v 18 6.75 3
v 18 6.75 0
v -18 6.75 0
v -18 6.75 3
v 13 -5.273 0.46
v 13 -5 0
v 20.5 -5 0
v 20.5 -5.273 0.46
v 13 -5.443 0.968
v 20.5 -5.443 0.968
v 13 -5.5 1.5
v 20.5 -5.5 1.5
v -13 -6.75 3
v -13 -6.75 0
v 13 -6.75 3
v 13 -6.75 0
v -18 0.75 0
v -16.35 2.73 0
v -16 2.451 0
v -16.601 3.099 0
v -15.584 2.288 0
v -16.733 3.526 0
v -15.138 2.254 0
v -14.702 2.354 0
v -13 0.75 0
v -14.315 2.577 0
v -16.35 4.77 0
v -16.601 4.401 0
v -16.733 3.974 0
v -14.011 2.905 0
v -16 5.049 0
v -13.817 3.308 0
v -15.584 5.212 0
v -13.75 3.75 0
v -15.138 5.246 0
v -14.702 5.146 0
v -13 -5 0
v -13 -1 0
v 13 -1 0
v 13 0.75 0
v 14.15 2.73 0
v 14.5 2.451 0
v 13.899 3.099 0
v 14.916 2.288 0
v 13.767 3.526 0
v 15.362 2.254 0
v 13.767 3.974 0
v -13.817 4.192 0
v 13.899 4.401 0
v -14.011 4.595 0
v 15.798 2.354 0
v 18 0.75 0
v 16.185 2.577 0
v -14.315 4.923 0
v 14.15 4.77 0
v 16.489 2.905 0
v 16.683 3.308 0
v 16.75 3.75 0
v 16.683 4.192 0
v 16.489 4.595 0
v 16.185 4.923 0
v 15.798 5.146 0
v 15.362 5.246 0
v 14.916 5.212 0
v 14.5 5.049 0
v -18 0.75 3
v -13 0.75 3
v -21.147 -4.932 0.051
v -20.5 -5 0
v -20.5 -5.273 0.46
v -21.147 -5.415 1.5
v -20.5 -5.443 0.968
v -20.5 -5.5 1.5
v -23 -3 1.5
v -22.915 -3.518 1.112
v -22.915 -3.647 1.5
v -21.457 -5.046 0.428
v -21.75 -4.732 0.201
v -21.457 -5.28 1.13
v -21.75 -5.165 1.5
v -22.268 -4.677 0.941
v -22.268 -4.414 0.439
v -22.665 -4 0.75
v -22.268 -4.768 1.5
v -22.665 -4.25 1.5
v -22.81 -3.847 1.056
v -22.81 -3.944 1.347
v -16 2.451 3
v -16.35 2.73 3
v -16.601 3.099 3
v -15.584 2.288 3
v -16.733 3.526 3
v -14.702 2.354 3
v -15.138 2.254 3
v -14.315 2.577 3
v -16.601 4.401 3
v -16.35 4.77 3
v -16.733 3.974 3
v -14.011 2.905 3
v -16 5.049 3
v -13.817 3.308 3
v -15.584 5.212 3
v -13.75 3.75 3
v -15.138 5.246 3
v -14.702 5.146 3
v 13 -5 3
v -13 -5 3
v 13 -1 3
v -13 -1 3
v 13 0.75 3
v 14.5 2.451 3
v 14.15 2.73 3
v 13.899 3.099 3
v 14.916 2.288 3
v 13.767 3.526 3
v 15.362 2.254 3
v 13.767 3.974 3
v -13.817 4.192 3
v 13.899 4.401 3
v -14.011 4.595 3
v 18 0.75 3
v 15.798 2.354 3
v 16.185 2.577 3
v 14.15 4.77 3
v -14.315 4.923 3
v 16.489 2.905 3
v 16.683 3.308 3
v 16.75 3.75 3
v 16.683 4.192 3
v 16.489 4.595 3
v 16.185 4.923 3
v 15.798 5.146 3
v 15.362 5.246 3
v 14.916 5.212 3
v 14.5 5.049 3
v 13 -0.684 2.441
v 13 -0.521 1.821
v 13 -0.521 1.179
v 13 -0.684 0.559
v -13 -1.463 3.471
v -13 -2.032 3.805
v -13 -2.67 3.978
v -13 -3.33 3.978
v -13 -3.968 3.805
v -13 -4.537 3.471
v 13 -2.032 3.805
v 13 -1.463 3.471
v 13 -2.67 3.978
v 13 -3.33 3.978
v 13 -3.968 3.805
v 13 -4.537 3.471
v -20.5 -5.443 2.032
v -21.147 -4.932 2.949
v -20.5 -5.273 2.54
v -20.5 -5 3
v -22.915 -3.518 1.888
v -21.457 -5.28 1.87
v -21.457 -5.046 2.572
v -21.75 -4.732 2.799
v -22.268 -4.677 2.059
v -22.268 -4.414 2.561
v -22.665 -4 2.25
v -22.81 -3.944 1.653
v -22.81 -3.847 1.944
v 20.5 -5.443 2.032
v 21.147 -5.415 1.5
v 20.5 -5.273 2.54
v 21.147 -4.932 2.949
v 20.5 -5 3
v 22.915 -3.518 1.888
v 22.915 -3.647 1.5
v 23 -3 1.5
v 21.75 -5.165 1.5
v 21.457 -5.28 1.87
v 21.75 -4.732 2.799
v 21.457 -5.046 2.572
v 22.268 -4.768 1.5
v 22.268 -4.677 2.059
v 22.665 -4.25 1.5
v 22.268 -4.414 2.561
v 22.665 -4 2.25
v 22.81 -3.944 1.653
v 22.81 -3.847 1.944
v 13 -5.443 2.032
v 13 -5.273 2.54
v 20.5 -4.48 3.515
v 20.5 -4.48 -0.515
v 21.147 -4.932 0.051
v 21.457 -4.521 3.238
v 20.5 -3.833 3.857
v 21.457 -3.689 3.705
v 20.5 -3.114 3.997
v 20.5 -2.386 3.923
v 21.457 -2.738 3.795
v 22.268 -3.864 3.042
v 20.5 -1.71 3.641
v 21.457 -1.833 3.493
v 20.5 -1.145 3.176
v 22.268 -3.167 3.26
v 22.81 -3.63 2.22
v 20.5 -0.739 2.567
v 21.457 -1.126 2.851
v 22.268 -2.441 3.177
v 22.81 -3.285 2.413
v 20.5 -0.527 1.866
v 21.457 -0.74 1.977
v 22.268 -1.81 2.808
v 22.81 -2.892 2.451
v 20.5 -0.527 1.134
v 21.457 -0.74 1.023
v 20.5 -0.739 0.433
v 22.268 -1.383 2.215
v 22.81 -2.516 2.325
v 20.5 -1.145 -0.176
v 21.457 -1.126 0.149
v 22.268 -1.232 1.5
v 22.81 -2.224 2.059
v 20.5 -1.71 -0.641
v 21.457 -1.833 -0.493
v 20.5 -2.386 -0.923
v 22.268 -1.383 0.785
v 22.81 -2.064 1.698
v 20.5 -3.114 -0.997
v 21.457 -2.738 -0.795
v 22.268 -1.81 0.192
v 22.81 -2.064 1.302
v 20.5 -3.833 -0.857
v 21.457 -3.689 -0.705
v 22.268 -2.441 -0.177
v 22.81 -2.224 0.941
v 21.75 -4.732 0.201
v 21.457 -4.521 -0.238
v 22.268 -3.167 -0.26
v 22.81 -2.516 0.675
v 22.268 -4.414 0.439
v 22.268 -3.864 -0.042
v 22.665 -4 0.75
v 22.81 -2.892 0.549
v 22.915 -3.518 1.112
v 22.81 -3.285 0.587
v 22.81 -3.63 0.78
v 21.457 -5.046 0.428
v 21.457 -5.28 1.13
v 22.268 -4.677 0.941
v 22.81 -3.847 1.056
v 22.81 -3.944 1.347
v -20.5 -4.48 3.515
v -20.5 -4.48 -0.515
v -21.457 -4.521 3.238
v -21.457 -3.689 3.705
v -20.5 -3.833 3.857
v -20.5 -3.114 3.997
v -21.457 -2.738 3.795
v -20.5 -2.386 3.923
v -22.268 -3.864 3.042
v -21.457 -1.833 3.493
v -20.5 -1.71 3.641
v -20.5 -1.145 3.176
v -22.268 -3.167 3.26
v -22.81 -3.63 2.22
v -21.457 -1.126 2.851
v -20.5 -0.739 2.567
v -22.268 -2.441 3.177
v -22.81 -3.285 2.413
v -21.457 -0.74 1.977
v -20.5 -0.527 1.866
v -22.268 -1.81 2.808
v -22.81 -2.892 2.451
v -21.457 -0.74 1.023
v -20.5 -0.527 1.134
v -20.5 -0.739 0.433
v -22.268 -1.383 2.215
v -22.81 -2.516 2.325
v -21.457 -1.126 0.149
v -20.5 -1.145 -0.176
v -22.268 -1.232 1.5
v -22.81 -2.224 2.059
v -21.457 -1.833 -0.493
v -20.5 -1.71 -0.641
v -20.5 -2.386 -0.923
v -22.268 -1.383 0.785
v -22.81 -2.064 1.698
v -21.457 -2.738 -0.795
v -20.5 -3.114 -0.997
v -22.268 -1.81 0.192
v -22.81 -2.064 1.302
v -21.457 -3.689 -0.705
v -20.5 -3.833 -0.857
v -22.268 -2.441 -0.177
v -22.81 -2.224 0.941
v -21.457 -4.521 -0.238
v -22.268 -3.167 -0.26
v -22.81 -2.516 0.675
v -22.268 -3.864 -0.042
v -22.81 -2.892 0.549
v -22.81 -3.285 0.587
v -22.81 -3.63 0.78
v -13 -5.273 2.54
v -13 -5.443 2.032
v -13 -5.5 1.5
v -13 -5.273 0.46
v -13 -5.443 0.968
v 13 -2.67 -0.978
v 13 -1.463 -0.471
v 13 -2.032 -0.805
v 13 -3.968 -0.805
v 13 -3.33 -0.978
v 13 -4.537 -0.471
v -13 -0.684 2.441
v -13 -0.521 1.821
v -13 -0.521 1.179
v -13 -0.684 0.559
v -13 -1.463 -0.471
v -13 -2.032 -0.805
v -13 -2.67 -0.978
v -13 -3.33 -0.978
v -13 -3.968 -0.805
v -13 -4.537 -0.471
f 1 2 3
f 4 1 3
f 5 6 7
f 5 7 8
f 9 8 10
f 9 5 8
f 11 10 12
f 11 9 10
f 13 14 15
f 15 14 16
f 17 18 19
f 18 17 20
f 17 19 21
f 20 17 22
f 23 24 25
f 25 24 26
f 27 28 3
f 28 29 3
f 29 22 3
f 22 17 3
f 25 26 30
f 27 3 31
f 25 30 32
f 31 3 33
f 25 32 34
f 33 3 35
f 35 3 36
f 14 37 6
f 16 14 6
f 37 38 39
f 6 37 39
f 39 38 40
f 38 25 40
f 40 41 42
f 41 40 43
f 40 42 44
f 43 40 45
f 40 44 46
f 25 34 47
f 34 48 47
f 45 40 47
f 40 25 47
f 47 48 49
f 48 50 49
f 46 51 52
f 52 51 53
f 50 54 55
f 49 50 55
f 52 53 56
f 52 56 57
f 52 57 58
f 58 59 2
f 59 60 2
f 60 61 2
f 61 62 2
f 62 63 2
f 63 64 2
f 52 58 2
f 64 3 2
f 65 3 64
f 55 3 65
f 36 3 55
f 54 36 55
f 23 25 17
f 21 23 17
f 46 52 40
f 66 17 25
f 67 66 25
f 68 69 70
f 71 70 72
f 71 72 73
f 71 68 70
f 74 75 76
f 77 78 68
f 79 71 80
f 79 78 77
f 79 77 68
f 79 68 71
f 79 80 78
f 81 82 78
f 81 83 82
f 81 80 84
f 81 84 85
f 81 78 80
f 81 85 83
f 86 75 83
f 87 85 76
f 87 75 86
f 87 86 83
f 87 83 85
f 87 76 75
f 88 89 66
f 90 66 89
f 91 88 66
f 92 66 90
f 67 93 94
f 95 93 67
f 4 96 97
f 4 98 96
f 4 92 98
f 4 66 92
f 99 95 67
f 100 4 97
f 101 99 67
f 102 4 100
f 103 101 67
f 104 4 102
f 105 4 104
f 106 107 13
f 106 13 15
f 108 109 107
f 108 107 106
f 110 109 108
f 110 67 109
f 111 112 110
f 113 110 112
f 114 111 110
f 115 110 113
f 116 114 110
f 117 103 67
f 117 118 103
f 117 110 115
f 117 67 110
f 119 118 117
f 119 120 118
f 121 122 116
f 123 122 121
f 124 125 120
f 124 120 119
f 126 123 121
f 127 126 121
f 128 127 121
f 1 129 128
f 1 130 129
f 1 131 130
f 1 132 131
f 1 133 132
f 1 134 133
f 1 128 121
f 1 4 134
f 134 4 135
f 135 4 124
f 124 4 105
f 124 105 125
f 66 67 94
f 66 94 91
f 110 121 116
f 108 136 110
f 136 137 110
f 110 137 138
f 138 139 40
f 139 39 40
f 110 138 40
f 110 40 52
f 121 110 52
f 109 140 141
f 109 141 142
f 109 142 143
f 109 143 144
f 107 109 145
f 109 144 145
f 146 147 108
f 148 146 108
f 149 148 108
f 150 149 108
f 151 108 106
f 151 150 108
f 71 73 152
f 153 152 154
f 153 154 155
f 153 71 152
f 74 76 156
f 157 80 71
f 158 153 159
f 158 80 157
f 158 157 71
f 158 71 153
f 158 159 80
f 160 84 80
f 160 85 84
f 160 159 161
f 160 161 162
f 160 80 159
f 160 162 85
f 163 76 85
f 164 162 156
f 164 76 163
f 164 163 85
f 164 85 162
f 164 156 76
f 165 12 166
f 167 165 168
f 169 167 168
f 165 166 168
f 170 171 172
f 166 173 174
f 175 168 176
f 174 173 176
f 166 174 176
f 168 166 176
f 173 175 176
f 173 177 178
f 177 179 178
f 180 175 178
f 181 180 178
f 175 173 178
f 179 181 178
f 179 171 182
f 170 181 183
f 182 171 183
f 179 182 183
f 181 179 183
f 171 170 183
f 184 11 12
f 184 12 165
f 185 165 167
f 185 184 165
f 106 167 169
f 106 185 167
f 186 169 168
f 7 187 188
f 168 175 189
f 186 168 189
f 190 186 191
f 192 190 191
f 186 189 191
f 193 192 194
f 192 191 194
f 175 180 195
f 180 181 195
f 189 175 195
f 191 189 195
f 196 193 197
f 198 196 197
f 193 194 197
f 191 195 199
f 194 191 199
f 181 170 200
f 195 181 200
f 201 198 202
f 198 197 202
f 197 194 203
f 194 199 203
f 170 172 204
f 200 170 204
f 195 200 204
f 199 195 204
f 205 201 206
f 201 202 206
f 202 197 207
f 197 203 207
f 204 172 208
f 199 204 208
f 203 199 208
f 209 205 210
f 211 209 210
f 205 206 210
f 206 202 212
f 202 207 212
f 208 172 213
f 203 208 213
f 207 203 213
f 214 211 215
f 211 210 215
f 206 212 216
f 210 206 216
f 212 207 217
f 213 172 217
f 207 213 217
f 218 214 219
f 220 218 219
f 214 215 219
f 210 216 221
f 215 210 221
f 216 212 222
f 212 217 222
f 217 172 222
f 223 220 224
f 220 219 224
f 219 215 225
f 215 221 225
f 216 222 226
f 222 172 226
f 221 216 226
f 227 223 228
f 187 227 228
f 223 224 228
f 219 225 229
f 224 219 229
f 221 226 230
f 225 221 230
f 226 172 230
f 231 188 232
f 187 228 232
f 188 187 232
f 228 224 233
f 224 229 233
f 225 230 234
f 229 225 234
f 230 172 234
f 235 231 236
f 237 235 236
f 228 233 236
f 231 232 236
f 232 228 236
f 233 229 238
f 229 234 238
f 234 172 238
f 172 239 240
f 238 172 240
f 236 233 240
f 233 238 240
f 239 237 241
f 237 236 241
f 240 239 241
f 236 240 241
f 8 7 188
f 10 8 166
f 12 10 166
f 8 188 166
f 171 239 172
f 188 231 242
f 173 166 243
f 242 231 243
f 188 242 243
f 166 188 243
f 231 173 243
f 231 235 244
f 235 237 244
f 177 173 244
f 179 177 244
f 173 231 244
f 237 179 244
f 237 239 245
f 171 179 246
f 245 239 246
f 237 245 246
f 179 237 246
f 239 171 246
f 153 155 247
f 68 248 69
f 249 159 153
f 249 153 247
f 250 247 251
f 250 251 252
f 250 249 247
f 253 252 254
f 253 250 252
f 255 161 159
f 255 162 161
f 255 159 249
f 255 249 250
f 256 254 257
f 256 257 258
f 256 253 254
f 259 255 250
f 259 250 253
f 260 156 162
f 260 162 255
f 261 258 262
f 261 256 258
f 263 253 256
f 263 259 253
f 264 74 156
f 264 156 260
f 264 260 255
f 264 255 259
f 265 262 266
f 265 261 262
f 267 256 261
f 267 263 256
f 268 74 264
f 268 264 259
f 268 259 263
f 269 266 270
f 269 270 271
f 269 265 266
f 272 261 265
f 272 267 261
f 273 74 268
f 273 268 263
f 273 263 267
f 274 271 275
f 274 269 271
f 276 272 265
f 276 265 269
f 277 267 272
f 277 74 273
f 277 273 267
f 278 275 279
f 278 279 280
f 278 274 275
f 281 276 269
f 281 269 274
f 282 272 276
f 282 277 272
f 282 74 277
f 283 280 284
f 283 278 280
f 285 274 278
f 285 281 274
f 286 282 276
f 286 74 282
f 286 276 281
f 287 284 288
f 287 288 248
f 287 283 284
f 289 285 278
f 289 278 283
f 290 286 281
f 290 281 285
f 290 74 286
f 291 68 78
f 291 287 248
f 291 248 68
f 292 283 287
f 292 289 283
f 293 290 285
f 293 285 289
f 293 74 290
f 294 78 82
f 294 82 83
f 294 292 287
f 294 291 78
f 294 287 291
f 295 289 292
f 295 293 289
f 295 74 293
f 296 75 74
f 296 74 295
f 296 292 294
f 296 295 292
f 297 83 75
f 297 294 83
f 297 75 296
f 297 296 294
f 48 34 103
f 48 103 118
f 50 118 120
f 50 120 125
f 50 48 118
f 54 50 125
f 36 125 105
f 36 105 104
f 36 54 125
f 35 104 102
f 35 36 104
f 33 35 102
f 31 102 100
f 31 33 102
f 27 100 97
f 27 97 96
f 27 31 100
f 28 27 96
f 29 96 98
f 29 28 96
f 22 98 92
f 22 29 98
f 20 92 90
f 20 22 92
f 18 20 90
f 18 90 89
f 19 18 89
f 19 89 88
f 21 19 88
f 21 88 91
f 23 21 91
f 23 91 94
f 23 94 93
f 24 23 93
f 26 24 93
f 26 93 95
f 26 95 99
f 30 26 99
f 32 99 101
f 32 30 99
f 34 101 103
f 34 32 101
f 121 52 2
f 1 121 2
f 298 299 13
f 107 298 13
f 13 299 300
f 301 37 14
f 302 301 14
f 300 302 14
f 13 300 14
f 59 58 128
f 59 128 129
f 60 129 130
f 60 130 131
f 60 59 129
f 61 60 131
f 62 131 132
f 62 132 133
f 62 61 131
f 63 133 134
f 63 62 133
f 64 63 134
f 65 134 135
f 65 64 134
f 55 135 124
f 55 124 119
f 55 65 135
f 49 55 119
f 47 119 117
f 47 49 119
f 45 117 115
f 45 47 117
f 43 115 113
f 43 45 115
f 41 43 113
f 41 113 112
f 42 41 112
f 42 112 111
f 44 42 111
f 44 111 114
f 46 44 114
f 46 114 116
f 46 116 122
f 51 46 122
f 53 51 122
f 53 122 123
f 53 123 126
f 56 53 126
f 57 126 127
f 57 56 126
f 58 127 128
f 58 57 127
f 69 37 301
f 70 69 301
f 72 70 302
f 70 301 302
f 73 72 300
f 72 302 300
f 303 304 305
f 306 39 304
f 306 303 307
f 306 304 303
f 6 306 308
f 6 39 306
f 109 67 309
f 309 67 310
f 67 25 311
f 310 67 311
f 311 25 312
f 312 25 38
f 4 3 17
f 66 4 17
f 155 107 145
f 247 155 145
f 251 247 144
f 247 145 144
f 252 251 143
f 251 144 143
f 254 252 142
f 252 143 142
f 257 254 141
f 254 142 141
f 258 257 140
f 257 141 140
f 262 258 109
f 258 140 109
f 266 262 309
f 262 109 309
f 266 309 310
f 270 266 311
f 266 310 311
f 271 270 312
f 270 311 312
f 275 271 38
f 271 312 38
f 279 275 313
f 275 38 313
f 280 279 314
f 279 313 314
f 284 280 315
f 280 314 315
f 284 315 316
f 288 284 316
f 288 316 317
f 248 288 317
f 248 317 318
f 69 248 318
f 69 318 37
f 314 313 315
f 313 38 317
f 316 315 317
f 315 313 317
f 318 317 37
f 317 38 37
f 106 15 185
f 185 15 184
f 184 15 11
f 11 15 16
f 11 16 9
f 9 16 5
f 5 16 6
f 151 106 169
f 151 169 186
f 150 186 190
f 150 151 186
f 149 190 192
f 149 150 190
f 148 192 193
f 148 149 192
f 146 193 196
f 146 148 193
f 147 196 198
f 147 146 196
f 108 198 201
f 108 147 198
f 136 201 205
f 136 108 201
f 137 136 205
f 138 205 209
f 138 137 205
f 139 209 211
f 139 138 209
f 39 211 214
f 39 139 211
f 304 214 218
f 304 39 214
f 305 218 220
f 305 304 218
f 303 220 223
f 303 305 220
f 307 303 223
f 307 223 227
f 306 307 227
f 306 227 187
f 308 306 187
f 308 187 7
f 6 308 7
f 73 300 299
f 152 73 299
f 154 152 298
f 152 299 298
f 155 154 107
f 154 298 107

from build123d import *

# Parameters (mm, degrees)
F0_R     = 1.5
F1_DEPTH = 3
F3_DEPTH = 10
F4_R     = 2.5


# Not quite as in the source:
# - a pattern or mirror of a feature is missing from the dataset's text; its kind, count and spacing are read off the source's solid


with BuildPart() as f1:
    # F0 (on Top) → F1 (new body)
    with BuildSketch(Plane.XY):
        Polygon((18, 0.75), (18, 6.75), (-18, 6.75), (-18, 0.75), (-13, 0.75), (-13, -6.75), (13, -6.75), (13, 0.75), align=None)
        with Locations((-15.25, 3.75)):
            Circle(F0_R, mode=Mode.SUBTRACT)
        with Locations((15.25, 3.75)):
            Circle(F0_R, mode=Mode.SUBTRACT)
    extrude(amount=F1_DEPTH)

    # F2 (on face) → F3 (join)
    with BuildSketch(Plane(origin=(-13, 0, 0), x_dir=(0, -1, 0), z_dir=(-1, 0, 0))):
        with BuildLine():
            ThreePointArc((1, 0), (3, -1), (5, 0))
            Line((5, 0), (1, 0))
        make_face()
        with BuildLine():
            ThreePointArc((5, 0), (5.3717082451, 0.709430585), (5.5, 1.5))
            ThreePointArc((5.5, 1.5), (5.3717082451, 2.290569415), (5, 3))
            Line((5, 3), (1, 3))
            ThreePointArc((1, 3), (0.5, 1.5), (1, 0))
            Line((1, 0), (5, 0))
        make_face()
        with BuildLine():
            Line((1, 3), (5, 3))
            ThreePointArc((5, 3), (3, 4), (1, 3))
        make_face()
    f3 = extrude(amount=F3_DEPTH)

    # F3_copies: F3 across plane
    add(f3.mirror(Plane(origin=(0, 0, 0), x_dir=(0, 0, 1), z_dir=(1, 0, 0))))

    # F4
    f4_edges = [f1.edges().sort_by_distance(p)[0] for p in [
        (-23, -1, 0),
        (23, -1, 0),
    ]]
    fillet(f4_edges, radius=F4_R)


solid = f1.part
